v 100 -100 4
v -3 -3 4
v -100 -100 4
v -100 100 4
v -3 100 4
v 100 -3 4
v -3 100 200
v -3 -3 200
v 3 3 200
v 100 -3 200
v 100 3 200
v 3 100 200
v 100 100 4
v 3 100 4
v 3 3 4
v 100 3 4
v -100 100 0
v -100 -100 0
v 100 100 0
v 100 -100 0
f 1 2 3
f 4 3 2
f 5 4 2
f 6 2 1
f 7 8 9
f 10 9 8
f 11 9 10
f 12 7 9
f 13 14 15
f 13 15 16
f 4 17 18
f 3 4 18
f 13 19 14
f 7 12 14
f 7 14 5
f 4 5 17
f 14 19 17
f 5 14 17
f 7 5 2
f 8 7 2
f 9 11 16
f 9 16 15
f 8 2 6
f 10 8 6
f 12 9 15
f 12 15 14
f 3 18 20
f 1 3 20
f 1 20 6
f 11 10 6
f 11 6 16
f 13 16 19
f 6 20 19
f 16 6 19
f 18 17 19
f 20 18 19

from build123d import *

# Parameters (mm, degrees)
SZKIC1_W                    = 100
SZKIC1_H                    = 100
DODANIE_WYCI_GNI_CIE1_DEPTH = 4
DODANIE_WYCI_GNI_CIE3_DEPTH = 196


with BuildPart() as part:
    # Szkic1 → Dodanie-wyciągnięcie1 (new body)
    with BuildSketch(Plane.XY):
        with Locations((-50, 50)):
            Rectangle(SZKIC1_W, SZKIC1_H)
        with Locations((50, 50)):
            Rectangle(SZKIC1_W, SZKIC1_H)
        with Locations((50, -50)):
            Rectangle(SZKIC1_W, SZKIC1_H)
        with Locations((-50, -50)):
            Rectangle(SZKIC1_W, SZKIC1_H)
    extrude(amount=DODANIE_WYCI_GNI_CIE1_DEPTH)

    # Szkic2 → Dodanie-wyciągnięcie3 (add)
    with BuildSketch(Plane.XY.offset(4)):
        Polygon((100, 3), (3, 3), (3, 100), (-3, 100), (-3, -3), (100, -3), align=None)
    extrude(amount=DODANIE_WYCI_GNI_CIE3_DEPTH)


solid = part.part
